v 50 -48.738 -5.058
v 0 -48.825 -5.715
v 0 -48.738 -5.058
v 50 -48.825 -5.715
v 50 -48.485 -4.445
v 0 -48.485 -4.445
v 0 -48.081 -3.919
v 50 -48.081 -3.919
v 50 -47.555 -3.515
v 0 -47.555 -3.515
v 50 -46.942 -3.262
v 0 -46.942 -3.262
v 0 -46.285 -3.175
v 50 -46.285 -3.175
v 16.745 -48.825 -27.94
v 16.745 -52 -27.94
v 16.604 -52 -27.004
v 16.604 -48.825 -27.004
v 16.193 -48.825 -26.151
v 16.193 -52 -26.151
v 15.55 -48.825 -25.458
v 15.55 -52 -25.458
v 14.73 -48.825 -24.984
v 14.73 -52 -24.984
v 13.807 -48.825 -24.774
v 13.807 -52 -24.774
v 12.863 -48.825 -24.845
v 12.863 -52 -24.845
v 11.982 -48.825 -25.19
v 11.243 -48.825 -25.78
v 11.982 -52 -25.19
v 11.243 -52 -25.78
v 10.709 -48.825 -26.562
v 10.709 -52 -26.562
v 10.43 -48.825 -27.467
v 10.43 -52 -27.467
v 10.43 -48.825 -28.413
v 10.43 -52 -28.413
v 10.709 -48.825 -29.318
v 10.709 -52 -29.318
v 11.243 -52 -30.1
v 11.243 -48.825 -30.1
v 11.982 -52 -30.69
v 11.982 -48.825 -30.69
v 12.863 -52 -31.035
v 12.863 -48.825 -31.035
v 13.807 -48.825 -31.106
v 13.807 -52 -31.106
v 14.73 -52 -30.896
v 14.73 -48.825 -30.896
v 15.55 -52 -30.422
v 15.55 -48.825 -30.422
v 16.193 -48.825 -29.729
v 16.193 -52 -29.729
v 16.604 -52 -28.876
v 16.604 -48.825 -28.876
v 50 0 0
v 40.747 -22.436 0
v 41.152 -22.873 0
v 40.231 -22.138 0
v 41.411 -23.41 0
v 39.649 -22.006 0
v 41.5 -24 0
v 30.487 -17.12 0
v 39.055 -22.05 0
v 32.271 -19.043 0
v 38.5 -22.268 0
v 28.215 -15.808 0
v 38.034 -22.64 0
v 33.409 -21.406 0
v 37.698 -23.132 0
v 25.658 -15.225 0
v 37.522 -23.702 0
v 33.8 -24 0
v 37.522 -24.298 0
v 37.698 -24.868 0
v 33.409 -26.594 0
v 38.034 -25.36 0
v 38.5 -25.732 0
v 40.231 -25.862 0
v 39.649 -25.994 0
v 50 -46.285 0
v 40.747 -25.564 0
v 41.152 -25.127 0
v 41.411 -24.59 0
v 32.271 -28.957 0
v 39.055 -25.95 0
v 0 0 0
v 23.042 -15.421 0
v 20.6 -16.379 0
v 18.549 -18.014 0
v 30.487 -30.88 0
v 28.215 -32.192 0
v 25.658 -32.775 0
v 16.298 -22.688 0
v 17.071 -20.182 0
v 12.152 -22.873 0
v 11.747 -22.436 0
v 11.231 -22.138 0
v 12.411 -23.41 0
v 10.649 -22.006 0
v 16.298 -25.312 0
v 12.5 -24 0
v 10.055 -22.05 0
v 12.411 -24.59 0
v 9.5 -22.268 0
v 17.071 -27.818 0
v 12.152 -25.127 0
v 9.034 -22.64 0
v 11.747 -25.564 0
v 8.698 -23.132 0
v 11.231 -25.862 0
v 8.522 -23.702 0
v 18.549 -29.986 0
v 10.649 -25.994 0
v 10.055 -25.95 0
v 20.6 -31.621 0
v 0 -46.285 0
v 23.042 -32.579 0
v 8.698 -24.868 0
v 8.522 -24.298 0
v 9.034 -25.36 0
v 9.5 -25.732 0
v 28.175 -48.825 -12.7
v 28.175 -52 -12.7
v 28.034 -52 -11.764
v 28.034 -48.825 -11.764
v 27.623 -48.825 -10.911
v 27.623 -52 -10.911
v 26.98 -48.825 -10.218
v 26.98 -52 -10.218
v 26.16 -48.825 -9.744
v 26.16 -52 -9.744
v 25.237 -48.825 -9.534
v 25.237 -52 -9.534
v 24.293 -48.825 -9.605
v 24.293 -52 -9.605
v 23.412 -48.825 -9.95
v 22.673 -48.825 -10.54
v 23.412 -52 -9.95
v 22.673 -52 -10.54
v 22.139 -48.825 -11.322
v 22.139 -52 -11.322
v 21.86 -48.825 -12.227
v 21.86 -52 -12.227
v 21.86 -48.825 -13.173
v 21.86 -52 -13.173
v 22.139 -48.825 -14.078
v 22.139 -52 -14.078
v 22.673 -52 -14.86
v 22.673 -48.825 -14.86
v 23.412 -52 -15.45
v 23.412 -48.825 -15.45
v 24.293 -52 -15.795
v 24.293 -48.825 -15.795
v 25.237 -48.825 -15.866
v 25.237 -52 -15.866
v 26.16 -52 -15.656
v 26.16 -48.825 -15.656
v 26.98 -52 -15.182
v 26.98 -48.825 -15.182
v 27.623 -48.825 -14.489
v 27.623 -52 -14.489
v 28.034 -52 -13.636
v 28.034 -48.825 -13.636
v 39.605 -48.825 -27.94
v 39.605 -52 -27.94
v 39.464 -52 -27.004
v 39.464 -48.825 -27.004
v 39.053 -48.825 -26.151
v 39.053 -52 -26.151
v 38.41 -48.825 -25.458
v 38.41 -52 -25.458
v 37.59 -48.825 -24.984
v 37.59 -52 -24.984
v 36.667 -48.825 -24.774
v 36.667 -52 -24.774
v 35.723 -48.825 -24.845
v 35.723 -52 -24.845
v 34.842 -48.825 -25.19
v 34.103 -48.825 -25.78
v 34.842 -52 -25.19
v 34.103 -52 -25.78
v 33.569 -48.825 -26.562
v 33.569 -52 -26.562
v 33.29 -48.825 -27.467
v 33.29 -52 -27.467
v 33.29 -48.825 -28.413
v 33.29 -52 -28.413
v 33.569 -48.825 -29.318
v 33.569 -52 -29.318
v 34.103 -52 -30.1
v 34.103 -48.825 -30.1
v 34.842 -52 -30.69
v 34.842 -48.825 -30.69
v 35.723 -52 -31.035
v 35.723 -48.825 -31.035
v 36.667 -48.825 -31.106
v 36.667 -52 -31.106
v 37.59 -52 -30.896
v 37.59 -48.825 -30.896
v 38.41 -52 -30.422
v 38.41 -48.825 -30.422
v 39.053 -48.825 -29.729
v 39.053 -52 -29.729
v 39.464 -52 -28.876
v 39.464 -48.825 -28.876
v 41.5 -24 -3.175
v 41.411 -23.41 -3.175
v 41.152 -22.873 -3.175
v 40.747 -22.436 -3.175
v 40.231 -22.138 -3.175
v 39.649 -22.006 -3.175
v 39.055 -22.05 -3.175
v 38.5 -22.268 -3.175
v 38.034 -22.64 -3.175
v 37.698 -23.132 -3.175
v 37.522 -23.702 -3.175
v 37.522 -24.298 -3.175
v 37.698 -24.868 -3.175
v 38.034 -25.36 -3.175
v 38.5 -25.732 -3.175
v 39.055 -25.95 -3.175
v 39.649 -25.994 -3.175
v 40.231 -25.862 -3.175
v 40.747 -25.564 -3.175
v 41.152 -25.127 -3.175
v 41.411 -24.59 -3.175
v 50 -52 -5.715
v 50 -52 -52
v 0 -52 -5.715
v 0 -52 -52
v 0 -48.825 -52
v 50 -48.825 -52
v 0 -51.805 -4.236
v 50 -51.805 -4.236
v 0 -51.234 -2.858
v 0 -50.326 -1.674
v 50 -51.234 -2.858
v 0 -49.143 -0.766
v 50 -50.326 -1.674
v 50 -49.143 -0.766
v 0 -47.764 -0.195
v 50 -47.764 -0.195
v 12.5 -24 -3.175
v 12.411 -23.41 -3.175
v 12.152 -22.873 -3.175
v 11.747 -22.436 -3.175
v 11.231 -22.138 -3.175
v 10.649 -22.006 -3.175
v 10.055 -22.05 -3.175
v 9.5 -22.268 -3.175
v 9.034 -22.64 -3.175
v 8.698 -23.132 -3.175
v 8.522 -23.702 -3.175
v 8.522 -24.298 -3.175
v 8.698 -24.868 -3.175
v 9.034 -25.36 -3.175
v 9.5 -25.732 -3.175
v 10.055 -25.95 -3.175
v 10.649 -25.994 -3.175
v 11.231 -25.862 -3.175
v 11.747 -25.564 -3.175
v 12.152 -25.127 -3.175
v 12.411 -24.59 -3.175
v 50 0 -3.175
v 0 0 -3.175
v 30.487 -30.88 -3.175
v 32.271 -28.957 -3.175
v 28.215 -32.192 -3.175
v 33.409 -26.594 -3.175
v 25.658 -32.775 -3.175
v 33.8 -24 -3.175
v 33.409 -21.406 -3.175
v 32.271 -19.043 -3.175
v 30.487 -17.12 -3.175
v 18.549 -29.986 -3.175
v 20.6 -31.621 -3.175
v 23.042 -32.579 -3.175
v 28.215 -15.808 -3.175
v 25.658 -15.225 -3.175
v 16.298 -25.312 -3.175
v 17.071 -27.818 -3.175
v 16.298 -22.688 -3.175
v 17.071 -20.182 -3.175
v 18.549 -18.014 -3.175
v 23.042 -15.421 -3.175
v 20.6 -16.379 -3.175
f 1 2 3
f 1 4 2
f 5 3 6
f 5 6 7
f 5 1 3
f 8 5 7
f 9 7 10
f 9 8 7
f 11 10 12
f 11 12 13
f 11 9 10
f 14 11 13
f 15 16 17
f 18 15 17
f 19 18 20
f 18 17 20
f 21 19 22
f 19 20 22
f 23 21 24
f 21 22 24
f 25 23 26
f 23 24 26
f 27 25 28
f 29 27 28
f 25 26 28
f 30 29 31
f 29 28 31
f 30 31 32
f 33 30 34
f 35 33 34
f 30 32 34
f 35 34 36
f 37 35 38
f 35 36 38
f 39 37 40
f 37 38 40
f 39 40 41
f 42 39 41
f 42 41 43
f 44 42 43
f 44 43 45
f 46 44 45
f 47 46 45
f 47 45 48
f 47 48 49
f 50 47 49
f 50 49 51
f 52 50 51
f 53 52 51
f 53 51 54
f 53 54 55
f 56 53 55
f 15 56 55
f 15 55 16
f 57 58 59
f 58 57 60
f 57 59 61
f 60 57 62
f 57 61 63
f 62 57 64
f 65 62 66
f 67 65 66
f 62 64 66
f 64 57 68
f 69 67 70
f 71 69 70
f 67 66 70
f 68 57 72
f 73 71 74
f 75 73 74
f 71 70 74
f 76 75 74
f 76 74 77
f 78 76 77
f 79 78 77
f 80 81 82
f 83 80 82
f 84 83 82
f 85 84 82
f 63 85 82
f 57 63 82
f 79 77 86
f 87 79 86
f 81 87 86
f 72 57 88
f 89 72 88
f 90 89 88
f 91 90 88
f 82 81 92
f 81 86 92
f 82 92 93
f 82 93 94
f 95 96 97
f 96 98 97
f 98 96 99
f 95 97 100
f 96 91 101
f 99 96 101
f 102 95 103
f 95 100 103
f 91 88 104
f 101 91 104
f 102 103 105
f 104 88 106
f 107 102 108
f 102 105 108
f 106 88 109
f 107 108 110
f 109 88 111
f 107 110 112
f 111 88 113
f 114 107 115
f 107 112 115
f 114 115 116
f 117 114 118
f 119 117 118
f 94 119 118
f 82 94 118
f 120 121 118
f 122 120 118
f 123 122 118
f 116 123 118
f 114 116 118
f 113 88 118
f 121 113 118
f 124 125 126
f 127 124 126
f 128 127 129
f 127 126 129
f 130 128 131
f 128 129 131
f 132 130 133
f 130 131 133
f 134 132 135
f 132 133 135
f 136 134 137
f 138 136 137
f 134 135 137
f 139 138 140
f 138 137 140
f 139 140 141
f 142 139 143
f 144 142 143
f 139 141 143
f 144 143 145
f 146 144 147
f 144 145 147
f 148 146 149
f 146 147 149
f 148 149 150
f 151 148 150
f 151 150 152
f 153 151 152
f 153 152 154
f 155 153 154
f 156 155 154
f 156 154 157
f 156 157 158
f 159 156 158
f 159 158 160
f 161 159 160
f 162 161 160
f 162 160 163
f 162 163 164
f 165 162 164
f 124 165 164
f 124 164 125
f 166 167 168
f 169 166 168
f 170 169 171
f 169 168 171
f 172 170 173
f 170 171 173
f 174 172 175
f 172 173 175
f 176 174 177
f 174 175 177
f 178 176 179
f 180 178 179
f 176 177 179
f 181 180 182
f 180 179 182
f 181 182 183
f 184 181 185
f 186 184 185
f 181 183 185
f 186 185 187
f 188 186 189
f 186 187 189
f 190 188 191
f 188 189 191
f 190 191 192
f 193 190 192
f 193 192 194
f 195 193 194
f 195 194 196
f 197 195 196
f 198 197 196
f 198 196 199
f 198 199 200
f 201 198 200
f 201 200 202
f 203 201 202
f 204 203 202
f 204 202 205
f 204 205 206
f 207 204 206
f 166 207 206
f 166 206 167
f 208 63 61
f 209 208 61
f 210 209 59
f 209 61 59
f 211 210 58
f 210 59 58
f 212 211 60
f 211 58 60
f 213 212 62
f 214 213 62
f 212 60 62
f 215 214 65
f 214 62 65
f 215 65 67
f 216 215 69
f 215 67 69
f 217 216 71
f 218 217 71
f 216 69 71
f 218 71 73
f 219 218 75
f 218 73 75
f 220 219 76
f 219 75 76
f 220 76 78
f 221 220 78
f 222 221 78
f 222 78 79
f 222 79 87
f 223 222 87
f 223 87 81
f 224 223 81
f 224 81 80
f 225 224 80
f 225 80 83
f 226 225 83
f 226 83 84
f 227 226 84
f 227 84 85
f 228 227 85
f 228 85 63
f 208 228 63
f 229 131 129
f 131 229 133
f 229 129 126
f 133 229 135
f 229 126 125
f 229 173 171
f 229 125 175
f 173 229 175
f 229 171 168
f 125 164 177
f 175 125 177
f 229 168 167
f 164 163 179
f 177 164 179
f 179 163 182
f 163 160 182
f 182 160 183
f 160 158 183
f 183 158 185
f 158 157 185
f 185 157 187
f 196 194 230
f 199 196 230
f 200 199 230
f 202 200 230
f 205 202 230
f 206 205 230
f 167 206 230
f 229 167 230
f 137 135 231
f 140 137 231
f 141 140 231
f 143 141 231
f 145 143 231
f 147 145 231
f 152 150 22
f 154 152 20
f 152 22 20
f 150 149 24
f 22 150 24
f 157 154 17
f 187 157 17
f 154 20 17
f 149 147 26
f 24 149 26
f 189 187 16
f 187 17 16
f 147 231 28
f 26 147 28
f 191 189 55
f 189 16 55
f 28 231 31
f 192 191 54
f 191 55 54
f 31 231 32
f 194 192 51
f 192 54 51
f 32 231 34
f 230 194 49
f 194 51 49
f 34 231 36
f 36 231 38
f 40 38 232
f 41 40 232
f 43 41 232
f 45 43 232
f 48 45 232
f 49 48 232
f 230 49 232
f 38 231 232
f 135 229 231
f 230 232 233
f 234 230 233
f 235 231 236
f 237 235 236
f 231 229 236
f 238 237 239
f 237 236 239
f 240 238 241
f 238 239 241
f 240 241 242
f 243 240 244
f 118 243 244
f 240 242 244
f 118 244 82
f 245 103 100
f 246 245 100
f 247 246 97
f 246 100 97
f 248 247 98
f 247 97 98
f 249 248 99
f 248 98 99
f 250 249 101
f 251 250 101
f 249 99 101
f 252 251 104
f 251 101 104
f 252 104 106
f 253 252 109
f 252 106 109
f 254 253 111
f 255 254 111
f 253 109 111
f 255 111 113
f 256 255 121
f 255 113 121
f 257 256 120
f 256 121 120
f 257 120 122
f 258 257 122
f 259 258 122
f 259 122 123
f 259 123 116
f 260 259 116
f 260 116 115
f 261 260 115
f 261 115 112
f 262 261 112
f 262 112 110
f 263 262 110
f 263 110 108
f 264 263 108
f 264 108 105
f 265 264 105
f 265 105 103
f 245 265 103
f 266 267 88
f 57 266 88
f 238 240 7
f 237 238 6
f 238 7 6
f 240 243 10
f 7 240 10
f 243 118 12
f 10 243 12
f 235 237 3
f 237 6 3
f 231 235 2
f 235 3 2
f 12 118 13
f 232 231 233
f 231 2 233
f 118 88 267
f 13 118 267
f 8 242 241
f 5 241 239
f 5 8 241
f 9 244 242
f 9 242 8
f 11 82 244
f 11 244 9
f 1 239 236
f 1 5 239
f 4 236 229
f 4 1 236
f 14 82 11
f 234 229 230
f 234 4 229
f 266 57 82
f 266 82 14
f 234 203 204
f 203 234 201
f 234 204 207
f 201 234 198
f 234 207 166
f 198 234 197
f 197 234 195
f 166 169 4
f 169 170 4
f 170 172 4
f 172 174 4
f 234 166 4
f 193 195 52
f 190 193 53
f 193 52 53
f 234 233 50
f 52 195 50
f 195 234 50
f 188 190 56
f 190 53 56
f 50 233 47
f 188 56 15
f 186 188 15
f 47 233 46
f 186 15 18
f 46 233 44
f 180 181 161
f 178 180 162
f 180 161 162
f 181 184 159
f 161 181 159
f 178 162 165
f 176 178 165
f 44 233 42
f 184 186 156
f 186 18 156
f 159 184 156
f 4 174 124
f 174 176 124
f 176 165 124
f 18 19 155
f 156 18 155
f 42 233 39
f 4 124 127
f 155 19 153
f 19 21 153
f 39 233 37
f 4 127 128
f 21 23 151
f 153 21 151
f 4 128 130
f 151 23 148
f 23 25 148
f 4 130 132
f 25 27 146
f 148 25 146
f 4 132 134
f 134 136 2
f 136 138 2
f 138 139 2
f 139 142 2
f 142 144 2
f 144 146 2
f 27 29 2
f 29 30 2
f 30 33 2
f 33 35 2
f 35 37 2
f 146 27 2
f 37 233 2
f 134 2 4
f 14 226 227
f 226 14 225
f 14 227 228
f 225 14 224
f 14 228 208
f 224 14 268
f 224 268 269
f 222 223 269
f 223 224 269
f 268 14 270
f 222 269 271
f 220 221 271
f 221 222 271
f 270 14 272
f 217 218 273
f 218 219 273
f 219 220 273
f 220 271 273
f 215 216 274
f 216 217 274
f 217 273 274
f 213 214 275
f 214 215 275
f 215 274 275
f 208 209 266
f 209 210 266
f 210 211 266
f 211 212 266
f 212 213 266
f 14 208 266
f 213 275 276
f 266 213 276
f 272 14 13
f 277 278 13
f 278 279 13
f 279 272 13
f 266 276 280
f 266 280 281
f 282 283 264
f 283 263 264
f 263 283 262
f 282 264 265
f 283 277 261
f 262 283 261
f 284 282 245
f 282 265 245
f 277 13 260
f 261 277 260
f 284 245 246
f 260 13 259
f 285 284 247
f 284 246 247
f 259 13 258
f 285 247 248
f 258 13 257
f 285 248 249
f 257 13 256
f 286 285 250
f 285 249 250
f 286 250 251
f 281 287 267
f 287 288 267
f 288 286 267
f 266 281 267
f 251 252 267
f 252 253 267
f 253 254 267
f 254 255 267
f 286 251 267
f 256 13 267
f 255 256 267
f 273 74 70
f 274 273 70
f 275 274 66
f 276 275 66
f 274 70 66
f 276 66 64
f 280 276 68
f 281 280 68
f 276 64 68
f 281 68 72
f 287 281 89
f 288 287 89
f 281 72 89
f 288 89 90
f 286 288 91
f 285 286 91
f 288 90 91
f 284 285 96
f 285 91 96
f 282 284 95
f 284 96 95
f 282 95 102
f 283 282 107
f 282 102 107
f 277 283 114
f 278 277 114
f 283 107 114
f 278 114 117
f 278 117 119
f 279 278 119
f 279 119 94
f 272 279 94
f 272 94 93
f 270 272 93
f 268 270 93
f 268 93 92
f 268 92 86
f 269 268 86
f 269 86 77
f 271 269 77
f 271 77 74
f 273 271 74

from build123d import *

# Parameters (mm, degrees)
BOSS_EXTRUDE1_DEPTH     = 50
FILLET1_R               = 2.54
FILLET2_R               = 5.715
SKETCH2_R               = 8.8
SKETCH2_R_2             = 2
CUT_EXTRUDE1_DEPTH      = 1
CUT_EXTRUDE1_DEPTH_BACK = 53
SKETCH4_R               = 3.175
CUT_EXTRUDE2_DEPTH      = 1
CUT_EXTRUDE2_DEPTH_BACK = 53


with BuildPart() as part:
    # Sketch1 → Boss-Extrude1 (new body)
    with BuildSketch(Plane(origin=(0, 0, 0), x_dir=(0, 0, -1), z_dir=(1, 0, 0))):
        Polygon((0, 0), (0, -52), (52, -52), (52, -48.825), (3.175, -48.825), (3.175, 0), align=None)
    extrude(amount=BOSS_EXTRUDE1_DEPTH)

    # Fillet1
    fillet1_edges = [part.edges().sort_by_distance(p)[0] for p in [
        (25, -48.825, -3.175),
    ]]
    fillet(fillet1_edges, radius=FILLET1_R)

    # Fillet2
    fillet2_edges = [part.edges().sort_by_distance(p)[0] for p in [
        (25, -52, 0),
    ]]
    fillet(fillet2_edges, radius=FILLET2_R)

    # Sketch2 → Cut-Extrude1 (cut, two sides)
    with BuildSketch(Plane.XY) as cut_extrude1_sk:
        with Locations((25, -24)):
            Circle(SKETCH2_R)
        with Locations((10.5, -24)):
            Circle(SKETCH2_R_2)
        with Locations((39.5, -24)):
            Circle(SKETCH2_R_2)
    extrude(amount=CUT_EXTRUDE1_DEPTH, mode=Mode.SUBTRACT)
    extrude(cut_extrude1_sk.sketch, amount=-CUT_EXTRUDE1_DEPTH_BACK, mode=Mode.SUBTRACT)

    # Sketch4 → Cut-Extrude2 (cut, two sides)
    with BuildSketch(Plane.XZ.offset(52)) as cut_extrude2_sk:
        with Locations((13.57, -27.94)):
            Circle(SKETCH4_R)
        with Locations((36.43, -27.94)):
            Circle(SKETCH4_R)
        with Locations((25, -12.7)):
            Circle(SKETCH4_R)
    extrude(amount=CUT_EXTRUDE2_DEPTH, mode=Mode.SUBTRACT)
    extrude(cut_extrude2_sk.sketch, amount=-CUT_EXTRUDE2_DEPTH_BACK, mode=Mode.SUBTRACT)


solid = part.part
